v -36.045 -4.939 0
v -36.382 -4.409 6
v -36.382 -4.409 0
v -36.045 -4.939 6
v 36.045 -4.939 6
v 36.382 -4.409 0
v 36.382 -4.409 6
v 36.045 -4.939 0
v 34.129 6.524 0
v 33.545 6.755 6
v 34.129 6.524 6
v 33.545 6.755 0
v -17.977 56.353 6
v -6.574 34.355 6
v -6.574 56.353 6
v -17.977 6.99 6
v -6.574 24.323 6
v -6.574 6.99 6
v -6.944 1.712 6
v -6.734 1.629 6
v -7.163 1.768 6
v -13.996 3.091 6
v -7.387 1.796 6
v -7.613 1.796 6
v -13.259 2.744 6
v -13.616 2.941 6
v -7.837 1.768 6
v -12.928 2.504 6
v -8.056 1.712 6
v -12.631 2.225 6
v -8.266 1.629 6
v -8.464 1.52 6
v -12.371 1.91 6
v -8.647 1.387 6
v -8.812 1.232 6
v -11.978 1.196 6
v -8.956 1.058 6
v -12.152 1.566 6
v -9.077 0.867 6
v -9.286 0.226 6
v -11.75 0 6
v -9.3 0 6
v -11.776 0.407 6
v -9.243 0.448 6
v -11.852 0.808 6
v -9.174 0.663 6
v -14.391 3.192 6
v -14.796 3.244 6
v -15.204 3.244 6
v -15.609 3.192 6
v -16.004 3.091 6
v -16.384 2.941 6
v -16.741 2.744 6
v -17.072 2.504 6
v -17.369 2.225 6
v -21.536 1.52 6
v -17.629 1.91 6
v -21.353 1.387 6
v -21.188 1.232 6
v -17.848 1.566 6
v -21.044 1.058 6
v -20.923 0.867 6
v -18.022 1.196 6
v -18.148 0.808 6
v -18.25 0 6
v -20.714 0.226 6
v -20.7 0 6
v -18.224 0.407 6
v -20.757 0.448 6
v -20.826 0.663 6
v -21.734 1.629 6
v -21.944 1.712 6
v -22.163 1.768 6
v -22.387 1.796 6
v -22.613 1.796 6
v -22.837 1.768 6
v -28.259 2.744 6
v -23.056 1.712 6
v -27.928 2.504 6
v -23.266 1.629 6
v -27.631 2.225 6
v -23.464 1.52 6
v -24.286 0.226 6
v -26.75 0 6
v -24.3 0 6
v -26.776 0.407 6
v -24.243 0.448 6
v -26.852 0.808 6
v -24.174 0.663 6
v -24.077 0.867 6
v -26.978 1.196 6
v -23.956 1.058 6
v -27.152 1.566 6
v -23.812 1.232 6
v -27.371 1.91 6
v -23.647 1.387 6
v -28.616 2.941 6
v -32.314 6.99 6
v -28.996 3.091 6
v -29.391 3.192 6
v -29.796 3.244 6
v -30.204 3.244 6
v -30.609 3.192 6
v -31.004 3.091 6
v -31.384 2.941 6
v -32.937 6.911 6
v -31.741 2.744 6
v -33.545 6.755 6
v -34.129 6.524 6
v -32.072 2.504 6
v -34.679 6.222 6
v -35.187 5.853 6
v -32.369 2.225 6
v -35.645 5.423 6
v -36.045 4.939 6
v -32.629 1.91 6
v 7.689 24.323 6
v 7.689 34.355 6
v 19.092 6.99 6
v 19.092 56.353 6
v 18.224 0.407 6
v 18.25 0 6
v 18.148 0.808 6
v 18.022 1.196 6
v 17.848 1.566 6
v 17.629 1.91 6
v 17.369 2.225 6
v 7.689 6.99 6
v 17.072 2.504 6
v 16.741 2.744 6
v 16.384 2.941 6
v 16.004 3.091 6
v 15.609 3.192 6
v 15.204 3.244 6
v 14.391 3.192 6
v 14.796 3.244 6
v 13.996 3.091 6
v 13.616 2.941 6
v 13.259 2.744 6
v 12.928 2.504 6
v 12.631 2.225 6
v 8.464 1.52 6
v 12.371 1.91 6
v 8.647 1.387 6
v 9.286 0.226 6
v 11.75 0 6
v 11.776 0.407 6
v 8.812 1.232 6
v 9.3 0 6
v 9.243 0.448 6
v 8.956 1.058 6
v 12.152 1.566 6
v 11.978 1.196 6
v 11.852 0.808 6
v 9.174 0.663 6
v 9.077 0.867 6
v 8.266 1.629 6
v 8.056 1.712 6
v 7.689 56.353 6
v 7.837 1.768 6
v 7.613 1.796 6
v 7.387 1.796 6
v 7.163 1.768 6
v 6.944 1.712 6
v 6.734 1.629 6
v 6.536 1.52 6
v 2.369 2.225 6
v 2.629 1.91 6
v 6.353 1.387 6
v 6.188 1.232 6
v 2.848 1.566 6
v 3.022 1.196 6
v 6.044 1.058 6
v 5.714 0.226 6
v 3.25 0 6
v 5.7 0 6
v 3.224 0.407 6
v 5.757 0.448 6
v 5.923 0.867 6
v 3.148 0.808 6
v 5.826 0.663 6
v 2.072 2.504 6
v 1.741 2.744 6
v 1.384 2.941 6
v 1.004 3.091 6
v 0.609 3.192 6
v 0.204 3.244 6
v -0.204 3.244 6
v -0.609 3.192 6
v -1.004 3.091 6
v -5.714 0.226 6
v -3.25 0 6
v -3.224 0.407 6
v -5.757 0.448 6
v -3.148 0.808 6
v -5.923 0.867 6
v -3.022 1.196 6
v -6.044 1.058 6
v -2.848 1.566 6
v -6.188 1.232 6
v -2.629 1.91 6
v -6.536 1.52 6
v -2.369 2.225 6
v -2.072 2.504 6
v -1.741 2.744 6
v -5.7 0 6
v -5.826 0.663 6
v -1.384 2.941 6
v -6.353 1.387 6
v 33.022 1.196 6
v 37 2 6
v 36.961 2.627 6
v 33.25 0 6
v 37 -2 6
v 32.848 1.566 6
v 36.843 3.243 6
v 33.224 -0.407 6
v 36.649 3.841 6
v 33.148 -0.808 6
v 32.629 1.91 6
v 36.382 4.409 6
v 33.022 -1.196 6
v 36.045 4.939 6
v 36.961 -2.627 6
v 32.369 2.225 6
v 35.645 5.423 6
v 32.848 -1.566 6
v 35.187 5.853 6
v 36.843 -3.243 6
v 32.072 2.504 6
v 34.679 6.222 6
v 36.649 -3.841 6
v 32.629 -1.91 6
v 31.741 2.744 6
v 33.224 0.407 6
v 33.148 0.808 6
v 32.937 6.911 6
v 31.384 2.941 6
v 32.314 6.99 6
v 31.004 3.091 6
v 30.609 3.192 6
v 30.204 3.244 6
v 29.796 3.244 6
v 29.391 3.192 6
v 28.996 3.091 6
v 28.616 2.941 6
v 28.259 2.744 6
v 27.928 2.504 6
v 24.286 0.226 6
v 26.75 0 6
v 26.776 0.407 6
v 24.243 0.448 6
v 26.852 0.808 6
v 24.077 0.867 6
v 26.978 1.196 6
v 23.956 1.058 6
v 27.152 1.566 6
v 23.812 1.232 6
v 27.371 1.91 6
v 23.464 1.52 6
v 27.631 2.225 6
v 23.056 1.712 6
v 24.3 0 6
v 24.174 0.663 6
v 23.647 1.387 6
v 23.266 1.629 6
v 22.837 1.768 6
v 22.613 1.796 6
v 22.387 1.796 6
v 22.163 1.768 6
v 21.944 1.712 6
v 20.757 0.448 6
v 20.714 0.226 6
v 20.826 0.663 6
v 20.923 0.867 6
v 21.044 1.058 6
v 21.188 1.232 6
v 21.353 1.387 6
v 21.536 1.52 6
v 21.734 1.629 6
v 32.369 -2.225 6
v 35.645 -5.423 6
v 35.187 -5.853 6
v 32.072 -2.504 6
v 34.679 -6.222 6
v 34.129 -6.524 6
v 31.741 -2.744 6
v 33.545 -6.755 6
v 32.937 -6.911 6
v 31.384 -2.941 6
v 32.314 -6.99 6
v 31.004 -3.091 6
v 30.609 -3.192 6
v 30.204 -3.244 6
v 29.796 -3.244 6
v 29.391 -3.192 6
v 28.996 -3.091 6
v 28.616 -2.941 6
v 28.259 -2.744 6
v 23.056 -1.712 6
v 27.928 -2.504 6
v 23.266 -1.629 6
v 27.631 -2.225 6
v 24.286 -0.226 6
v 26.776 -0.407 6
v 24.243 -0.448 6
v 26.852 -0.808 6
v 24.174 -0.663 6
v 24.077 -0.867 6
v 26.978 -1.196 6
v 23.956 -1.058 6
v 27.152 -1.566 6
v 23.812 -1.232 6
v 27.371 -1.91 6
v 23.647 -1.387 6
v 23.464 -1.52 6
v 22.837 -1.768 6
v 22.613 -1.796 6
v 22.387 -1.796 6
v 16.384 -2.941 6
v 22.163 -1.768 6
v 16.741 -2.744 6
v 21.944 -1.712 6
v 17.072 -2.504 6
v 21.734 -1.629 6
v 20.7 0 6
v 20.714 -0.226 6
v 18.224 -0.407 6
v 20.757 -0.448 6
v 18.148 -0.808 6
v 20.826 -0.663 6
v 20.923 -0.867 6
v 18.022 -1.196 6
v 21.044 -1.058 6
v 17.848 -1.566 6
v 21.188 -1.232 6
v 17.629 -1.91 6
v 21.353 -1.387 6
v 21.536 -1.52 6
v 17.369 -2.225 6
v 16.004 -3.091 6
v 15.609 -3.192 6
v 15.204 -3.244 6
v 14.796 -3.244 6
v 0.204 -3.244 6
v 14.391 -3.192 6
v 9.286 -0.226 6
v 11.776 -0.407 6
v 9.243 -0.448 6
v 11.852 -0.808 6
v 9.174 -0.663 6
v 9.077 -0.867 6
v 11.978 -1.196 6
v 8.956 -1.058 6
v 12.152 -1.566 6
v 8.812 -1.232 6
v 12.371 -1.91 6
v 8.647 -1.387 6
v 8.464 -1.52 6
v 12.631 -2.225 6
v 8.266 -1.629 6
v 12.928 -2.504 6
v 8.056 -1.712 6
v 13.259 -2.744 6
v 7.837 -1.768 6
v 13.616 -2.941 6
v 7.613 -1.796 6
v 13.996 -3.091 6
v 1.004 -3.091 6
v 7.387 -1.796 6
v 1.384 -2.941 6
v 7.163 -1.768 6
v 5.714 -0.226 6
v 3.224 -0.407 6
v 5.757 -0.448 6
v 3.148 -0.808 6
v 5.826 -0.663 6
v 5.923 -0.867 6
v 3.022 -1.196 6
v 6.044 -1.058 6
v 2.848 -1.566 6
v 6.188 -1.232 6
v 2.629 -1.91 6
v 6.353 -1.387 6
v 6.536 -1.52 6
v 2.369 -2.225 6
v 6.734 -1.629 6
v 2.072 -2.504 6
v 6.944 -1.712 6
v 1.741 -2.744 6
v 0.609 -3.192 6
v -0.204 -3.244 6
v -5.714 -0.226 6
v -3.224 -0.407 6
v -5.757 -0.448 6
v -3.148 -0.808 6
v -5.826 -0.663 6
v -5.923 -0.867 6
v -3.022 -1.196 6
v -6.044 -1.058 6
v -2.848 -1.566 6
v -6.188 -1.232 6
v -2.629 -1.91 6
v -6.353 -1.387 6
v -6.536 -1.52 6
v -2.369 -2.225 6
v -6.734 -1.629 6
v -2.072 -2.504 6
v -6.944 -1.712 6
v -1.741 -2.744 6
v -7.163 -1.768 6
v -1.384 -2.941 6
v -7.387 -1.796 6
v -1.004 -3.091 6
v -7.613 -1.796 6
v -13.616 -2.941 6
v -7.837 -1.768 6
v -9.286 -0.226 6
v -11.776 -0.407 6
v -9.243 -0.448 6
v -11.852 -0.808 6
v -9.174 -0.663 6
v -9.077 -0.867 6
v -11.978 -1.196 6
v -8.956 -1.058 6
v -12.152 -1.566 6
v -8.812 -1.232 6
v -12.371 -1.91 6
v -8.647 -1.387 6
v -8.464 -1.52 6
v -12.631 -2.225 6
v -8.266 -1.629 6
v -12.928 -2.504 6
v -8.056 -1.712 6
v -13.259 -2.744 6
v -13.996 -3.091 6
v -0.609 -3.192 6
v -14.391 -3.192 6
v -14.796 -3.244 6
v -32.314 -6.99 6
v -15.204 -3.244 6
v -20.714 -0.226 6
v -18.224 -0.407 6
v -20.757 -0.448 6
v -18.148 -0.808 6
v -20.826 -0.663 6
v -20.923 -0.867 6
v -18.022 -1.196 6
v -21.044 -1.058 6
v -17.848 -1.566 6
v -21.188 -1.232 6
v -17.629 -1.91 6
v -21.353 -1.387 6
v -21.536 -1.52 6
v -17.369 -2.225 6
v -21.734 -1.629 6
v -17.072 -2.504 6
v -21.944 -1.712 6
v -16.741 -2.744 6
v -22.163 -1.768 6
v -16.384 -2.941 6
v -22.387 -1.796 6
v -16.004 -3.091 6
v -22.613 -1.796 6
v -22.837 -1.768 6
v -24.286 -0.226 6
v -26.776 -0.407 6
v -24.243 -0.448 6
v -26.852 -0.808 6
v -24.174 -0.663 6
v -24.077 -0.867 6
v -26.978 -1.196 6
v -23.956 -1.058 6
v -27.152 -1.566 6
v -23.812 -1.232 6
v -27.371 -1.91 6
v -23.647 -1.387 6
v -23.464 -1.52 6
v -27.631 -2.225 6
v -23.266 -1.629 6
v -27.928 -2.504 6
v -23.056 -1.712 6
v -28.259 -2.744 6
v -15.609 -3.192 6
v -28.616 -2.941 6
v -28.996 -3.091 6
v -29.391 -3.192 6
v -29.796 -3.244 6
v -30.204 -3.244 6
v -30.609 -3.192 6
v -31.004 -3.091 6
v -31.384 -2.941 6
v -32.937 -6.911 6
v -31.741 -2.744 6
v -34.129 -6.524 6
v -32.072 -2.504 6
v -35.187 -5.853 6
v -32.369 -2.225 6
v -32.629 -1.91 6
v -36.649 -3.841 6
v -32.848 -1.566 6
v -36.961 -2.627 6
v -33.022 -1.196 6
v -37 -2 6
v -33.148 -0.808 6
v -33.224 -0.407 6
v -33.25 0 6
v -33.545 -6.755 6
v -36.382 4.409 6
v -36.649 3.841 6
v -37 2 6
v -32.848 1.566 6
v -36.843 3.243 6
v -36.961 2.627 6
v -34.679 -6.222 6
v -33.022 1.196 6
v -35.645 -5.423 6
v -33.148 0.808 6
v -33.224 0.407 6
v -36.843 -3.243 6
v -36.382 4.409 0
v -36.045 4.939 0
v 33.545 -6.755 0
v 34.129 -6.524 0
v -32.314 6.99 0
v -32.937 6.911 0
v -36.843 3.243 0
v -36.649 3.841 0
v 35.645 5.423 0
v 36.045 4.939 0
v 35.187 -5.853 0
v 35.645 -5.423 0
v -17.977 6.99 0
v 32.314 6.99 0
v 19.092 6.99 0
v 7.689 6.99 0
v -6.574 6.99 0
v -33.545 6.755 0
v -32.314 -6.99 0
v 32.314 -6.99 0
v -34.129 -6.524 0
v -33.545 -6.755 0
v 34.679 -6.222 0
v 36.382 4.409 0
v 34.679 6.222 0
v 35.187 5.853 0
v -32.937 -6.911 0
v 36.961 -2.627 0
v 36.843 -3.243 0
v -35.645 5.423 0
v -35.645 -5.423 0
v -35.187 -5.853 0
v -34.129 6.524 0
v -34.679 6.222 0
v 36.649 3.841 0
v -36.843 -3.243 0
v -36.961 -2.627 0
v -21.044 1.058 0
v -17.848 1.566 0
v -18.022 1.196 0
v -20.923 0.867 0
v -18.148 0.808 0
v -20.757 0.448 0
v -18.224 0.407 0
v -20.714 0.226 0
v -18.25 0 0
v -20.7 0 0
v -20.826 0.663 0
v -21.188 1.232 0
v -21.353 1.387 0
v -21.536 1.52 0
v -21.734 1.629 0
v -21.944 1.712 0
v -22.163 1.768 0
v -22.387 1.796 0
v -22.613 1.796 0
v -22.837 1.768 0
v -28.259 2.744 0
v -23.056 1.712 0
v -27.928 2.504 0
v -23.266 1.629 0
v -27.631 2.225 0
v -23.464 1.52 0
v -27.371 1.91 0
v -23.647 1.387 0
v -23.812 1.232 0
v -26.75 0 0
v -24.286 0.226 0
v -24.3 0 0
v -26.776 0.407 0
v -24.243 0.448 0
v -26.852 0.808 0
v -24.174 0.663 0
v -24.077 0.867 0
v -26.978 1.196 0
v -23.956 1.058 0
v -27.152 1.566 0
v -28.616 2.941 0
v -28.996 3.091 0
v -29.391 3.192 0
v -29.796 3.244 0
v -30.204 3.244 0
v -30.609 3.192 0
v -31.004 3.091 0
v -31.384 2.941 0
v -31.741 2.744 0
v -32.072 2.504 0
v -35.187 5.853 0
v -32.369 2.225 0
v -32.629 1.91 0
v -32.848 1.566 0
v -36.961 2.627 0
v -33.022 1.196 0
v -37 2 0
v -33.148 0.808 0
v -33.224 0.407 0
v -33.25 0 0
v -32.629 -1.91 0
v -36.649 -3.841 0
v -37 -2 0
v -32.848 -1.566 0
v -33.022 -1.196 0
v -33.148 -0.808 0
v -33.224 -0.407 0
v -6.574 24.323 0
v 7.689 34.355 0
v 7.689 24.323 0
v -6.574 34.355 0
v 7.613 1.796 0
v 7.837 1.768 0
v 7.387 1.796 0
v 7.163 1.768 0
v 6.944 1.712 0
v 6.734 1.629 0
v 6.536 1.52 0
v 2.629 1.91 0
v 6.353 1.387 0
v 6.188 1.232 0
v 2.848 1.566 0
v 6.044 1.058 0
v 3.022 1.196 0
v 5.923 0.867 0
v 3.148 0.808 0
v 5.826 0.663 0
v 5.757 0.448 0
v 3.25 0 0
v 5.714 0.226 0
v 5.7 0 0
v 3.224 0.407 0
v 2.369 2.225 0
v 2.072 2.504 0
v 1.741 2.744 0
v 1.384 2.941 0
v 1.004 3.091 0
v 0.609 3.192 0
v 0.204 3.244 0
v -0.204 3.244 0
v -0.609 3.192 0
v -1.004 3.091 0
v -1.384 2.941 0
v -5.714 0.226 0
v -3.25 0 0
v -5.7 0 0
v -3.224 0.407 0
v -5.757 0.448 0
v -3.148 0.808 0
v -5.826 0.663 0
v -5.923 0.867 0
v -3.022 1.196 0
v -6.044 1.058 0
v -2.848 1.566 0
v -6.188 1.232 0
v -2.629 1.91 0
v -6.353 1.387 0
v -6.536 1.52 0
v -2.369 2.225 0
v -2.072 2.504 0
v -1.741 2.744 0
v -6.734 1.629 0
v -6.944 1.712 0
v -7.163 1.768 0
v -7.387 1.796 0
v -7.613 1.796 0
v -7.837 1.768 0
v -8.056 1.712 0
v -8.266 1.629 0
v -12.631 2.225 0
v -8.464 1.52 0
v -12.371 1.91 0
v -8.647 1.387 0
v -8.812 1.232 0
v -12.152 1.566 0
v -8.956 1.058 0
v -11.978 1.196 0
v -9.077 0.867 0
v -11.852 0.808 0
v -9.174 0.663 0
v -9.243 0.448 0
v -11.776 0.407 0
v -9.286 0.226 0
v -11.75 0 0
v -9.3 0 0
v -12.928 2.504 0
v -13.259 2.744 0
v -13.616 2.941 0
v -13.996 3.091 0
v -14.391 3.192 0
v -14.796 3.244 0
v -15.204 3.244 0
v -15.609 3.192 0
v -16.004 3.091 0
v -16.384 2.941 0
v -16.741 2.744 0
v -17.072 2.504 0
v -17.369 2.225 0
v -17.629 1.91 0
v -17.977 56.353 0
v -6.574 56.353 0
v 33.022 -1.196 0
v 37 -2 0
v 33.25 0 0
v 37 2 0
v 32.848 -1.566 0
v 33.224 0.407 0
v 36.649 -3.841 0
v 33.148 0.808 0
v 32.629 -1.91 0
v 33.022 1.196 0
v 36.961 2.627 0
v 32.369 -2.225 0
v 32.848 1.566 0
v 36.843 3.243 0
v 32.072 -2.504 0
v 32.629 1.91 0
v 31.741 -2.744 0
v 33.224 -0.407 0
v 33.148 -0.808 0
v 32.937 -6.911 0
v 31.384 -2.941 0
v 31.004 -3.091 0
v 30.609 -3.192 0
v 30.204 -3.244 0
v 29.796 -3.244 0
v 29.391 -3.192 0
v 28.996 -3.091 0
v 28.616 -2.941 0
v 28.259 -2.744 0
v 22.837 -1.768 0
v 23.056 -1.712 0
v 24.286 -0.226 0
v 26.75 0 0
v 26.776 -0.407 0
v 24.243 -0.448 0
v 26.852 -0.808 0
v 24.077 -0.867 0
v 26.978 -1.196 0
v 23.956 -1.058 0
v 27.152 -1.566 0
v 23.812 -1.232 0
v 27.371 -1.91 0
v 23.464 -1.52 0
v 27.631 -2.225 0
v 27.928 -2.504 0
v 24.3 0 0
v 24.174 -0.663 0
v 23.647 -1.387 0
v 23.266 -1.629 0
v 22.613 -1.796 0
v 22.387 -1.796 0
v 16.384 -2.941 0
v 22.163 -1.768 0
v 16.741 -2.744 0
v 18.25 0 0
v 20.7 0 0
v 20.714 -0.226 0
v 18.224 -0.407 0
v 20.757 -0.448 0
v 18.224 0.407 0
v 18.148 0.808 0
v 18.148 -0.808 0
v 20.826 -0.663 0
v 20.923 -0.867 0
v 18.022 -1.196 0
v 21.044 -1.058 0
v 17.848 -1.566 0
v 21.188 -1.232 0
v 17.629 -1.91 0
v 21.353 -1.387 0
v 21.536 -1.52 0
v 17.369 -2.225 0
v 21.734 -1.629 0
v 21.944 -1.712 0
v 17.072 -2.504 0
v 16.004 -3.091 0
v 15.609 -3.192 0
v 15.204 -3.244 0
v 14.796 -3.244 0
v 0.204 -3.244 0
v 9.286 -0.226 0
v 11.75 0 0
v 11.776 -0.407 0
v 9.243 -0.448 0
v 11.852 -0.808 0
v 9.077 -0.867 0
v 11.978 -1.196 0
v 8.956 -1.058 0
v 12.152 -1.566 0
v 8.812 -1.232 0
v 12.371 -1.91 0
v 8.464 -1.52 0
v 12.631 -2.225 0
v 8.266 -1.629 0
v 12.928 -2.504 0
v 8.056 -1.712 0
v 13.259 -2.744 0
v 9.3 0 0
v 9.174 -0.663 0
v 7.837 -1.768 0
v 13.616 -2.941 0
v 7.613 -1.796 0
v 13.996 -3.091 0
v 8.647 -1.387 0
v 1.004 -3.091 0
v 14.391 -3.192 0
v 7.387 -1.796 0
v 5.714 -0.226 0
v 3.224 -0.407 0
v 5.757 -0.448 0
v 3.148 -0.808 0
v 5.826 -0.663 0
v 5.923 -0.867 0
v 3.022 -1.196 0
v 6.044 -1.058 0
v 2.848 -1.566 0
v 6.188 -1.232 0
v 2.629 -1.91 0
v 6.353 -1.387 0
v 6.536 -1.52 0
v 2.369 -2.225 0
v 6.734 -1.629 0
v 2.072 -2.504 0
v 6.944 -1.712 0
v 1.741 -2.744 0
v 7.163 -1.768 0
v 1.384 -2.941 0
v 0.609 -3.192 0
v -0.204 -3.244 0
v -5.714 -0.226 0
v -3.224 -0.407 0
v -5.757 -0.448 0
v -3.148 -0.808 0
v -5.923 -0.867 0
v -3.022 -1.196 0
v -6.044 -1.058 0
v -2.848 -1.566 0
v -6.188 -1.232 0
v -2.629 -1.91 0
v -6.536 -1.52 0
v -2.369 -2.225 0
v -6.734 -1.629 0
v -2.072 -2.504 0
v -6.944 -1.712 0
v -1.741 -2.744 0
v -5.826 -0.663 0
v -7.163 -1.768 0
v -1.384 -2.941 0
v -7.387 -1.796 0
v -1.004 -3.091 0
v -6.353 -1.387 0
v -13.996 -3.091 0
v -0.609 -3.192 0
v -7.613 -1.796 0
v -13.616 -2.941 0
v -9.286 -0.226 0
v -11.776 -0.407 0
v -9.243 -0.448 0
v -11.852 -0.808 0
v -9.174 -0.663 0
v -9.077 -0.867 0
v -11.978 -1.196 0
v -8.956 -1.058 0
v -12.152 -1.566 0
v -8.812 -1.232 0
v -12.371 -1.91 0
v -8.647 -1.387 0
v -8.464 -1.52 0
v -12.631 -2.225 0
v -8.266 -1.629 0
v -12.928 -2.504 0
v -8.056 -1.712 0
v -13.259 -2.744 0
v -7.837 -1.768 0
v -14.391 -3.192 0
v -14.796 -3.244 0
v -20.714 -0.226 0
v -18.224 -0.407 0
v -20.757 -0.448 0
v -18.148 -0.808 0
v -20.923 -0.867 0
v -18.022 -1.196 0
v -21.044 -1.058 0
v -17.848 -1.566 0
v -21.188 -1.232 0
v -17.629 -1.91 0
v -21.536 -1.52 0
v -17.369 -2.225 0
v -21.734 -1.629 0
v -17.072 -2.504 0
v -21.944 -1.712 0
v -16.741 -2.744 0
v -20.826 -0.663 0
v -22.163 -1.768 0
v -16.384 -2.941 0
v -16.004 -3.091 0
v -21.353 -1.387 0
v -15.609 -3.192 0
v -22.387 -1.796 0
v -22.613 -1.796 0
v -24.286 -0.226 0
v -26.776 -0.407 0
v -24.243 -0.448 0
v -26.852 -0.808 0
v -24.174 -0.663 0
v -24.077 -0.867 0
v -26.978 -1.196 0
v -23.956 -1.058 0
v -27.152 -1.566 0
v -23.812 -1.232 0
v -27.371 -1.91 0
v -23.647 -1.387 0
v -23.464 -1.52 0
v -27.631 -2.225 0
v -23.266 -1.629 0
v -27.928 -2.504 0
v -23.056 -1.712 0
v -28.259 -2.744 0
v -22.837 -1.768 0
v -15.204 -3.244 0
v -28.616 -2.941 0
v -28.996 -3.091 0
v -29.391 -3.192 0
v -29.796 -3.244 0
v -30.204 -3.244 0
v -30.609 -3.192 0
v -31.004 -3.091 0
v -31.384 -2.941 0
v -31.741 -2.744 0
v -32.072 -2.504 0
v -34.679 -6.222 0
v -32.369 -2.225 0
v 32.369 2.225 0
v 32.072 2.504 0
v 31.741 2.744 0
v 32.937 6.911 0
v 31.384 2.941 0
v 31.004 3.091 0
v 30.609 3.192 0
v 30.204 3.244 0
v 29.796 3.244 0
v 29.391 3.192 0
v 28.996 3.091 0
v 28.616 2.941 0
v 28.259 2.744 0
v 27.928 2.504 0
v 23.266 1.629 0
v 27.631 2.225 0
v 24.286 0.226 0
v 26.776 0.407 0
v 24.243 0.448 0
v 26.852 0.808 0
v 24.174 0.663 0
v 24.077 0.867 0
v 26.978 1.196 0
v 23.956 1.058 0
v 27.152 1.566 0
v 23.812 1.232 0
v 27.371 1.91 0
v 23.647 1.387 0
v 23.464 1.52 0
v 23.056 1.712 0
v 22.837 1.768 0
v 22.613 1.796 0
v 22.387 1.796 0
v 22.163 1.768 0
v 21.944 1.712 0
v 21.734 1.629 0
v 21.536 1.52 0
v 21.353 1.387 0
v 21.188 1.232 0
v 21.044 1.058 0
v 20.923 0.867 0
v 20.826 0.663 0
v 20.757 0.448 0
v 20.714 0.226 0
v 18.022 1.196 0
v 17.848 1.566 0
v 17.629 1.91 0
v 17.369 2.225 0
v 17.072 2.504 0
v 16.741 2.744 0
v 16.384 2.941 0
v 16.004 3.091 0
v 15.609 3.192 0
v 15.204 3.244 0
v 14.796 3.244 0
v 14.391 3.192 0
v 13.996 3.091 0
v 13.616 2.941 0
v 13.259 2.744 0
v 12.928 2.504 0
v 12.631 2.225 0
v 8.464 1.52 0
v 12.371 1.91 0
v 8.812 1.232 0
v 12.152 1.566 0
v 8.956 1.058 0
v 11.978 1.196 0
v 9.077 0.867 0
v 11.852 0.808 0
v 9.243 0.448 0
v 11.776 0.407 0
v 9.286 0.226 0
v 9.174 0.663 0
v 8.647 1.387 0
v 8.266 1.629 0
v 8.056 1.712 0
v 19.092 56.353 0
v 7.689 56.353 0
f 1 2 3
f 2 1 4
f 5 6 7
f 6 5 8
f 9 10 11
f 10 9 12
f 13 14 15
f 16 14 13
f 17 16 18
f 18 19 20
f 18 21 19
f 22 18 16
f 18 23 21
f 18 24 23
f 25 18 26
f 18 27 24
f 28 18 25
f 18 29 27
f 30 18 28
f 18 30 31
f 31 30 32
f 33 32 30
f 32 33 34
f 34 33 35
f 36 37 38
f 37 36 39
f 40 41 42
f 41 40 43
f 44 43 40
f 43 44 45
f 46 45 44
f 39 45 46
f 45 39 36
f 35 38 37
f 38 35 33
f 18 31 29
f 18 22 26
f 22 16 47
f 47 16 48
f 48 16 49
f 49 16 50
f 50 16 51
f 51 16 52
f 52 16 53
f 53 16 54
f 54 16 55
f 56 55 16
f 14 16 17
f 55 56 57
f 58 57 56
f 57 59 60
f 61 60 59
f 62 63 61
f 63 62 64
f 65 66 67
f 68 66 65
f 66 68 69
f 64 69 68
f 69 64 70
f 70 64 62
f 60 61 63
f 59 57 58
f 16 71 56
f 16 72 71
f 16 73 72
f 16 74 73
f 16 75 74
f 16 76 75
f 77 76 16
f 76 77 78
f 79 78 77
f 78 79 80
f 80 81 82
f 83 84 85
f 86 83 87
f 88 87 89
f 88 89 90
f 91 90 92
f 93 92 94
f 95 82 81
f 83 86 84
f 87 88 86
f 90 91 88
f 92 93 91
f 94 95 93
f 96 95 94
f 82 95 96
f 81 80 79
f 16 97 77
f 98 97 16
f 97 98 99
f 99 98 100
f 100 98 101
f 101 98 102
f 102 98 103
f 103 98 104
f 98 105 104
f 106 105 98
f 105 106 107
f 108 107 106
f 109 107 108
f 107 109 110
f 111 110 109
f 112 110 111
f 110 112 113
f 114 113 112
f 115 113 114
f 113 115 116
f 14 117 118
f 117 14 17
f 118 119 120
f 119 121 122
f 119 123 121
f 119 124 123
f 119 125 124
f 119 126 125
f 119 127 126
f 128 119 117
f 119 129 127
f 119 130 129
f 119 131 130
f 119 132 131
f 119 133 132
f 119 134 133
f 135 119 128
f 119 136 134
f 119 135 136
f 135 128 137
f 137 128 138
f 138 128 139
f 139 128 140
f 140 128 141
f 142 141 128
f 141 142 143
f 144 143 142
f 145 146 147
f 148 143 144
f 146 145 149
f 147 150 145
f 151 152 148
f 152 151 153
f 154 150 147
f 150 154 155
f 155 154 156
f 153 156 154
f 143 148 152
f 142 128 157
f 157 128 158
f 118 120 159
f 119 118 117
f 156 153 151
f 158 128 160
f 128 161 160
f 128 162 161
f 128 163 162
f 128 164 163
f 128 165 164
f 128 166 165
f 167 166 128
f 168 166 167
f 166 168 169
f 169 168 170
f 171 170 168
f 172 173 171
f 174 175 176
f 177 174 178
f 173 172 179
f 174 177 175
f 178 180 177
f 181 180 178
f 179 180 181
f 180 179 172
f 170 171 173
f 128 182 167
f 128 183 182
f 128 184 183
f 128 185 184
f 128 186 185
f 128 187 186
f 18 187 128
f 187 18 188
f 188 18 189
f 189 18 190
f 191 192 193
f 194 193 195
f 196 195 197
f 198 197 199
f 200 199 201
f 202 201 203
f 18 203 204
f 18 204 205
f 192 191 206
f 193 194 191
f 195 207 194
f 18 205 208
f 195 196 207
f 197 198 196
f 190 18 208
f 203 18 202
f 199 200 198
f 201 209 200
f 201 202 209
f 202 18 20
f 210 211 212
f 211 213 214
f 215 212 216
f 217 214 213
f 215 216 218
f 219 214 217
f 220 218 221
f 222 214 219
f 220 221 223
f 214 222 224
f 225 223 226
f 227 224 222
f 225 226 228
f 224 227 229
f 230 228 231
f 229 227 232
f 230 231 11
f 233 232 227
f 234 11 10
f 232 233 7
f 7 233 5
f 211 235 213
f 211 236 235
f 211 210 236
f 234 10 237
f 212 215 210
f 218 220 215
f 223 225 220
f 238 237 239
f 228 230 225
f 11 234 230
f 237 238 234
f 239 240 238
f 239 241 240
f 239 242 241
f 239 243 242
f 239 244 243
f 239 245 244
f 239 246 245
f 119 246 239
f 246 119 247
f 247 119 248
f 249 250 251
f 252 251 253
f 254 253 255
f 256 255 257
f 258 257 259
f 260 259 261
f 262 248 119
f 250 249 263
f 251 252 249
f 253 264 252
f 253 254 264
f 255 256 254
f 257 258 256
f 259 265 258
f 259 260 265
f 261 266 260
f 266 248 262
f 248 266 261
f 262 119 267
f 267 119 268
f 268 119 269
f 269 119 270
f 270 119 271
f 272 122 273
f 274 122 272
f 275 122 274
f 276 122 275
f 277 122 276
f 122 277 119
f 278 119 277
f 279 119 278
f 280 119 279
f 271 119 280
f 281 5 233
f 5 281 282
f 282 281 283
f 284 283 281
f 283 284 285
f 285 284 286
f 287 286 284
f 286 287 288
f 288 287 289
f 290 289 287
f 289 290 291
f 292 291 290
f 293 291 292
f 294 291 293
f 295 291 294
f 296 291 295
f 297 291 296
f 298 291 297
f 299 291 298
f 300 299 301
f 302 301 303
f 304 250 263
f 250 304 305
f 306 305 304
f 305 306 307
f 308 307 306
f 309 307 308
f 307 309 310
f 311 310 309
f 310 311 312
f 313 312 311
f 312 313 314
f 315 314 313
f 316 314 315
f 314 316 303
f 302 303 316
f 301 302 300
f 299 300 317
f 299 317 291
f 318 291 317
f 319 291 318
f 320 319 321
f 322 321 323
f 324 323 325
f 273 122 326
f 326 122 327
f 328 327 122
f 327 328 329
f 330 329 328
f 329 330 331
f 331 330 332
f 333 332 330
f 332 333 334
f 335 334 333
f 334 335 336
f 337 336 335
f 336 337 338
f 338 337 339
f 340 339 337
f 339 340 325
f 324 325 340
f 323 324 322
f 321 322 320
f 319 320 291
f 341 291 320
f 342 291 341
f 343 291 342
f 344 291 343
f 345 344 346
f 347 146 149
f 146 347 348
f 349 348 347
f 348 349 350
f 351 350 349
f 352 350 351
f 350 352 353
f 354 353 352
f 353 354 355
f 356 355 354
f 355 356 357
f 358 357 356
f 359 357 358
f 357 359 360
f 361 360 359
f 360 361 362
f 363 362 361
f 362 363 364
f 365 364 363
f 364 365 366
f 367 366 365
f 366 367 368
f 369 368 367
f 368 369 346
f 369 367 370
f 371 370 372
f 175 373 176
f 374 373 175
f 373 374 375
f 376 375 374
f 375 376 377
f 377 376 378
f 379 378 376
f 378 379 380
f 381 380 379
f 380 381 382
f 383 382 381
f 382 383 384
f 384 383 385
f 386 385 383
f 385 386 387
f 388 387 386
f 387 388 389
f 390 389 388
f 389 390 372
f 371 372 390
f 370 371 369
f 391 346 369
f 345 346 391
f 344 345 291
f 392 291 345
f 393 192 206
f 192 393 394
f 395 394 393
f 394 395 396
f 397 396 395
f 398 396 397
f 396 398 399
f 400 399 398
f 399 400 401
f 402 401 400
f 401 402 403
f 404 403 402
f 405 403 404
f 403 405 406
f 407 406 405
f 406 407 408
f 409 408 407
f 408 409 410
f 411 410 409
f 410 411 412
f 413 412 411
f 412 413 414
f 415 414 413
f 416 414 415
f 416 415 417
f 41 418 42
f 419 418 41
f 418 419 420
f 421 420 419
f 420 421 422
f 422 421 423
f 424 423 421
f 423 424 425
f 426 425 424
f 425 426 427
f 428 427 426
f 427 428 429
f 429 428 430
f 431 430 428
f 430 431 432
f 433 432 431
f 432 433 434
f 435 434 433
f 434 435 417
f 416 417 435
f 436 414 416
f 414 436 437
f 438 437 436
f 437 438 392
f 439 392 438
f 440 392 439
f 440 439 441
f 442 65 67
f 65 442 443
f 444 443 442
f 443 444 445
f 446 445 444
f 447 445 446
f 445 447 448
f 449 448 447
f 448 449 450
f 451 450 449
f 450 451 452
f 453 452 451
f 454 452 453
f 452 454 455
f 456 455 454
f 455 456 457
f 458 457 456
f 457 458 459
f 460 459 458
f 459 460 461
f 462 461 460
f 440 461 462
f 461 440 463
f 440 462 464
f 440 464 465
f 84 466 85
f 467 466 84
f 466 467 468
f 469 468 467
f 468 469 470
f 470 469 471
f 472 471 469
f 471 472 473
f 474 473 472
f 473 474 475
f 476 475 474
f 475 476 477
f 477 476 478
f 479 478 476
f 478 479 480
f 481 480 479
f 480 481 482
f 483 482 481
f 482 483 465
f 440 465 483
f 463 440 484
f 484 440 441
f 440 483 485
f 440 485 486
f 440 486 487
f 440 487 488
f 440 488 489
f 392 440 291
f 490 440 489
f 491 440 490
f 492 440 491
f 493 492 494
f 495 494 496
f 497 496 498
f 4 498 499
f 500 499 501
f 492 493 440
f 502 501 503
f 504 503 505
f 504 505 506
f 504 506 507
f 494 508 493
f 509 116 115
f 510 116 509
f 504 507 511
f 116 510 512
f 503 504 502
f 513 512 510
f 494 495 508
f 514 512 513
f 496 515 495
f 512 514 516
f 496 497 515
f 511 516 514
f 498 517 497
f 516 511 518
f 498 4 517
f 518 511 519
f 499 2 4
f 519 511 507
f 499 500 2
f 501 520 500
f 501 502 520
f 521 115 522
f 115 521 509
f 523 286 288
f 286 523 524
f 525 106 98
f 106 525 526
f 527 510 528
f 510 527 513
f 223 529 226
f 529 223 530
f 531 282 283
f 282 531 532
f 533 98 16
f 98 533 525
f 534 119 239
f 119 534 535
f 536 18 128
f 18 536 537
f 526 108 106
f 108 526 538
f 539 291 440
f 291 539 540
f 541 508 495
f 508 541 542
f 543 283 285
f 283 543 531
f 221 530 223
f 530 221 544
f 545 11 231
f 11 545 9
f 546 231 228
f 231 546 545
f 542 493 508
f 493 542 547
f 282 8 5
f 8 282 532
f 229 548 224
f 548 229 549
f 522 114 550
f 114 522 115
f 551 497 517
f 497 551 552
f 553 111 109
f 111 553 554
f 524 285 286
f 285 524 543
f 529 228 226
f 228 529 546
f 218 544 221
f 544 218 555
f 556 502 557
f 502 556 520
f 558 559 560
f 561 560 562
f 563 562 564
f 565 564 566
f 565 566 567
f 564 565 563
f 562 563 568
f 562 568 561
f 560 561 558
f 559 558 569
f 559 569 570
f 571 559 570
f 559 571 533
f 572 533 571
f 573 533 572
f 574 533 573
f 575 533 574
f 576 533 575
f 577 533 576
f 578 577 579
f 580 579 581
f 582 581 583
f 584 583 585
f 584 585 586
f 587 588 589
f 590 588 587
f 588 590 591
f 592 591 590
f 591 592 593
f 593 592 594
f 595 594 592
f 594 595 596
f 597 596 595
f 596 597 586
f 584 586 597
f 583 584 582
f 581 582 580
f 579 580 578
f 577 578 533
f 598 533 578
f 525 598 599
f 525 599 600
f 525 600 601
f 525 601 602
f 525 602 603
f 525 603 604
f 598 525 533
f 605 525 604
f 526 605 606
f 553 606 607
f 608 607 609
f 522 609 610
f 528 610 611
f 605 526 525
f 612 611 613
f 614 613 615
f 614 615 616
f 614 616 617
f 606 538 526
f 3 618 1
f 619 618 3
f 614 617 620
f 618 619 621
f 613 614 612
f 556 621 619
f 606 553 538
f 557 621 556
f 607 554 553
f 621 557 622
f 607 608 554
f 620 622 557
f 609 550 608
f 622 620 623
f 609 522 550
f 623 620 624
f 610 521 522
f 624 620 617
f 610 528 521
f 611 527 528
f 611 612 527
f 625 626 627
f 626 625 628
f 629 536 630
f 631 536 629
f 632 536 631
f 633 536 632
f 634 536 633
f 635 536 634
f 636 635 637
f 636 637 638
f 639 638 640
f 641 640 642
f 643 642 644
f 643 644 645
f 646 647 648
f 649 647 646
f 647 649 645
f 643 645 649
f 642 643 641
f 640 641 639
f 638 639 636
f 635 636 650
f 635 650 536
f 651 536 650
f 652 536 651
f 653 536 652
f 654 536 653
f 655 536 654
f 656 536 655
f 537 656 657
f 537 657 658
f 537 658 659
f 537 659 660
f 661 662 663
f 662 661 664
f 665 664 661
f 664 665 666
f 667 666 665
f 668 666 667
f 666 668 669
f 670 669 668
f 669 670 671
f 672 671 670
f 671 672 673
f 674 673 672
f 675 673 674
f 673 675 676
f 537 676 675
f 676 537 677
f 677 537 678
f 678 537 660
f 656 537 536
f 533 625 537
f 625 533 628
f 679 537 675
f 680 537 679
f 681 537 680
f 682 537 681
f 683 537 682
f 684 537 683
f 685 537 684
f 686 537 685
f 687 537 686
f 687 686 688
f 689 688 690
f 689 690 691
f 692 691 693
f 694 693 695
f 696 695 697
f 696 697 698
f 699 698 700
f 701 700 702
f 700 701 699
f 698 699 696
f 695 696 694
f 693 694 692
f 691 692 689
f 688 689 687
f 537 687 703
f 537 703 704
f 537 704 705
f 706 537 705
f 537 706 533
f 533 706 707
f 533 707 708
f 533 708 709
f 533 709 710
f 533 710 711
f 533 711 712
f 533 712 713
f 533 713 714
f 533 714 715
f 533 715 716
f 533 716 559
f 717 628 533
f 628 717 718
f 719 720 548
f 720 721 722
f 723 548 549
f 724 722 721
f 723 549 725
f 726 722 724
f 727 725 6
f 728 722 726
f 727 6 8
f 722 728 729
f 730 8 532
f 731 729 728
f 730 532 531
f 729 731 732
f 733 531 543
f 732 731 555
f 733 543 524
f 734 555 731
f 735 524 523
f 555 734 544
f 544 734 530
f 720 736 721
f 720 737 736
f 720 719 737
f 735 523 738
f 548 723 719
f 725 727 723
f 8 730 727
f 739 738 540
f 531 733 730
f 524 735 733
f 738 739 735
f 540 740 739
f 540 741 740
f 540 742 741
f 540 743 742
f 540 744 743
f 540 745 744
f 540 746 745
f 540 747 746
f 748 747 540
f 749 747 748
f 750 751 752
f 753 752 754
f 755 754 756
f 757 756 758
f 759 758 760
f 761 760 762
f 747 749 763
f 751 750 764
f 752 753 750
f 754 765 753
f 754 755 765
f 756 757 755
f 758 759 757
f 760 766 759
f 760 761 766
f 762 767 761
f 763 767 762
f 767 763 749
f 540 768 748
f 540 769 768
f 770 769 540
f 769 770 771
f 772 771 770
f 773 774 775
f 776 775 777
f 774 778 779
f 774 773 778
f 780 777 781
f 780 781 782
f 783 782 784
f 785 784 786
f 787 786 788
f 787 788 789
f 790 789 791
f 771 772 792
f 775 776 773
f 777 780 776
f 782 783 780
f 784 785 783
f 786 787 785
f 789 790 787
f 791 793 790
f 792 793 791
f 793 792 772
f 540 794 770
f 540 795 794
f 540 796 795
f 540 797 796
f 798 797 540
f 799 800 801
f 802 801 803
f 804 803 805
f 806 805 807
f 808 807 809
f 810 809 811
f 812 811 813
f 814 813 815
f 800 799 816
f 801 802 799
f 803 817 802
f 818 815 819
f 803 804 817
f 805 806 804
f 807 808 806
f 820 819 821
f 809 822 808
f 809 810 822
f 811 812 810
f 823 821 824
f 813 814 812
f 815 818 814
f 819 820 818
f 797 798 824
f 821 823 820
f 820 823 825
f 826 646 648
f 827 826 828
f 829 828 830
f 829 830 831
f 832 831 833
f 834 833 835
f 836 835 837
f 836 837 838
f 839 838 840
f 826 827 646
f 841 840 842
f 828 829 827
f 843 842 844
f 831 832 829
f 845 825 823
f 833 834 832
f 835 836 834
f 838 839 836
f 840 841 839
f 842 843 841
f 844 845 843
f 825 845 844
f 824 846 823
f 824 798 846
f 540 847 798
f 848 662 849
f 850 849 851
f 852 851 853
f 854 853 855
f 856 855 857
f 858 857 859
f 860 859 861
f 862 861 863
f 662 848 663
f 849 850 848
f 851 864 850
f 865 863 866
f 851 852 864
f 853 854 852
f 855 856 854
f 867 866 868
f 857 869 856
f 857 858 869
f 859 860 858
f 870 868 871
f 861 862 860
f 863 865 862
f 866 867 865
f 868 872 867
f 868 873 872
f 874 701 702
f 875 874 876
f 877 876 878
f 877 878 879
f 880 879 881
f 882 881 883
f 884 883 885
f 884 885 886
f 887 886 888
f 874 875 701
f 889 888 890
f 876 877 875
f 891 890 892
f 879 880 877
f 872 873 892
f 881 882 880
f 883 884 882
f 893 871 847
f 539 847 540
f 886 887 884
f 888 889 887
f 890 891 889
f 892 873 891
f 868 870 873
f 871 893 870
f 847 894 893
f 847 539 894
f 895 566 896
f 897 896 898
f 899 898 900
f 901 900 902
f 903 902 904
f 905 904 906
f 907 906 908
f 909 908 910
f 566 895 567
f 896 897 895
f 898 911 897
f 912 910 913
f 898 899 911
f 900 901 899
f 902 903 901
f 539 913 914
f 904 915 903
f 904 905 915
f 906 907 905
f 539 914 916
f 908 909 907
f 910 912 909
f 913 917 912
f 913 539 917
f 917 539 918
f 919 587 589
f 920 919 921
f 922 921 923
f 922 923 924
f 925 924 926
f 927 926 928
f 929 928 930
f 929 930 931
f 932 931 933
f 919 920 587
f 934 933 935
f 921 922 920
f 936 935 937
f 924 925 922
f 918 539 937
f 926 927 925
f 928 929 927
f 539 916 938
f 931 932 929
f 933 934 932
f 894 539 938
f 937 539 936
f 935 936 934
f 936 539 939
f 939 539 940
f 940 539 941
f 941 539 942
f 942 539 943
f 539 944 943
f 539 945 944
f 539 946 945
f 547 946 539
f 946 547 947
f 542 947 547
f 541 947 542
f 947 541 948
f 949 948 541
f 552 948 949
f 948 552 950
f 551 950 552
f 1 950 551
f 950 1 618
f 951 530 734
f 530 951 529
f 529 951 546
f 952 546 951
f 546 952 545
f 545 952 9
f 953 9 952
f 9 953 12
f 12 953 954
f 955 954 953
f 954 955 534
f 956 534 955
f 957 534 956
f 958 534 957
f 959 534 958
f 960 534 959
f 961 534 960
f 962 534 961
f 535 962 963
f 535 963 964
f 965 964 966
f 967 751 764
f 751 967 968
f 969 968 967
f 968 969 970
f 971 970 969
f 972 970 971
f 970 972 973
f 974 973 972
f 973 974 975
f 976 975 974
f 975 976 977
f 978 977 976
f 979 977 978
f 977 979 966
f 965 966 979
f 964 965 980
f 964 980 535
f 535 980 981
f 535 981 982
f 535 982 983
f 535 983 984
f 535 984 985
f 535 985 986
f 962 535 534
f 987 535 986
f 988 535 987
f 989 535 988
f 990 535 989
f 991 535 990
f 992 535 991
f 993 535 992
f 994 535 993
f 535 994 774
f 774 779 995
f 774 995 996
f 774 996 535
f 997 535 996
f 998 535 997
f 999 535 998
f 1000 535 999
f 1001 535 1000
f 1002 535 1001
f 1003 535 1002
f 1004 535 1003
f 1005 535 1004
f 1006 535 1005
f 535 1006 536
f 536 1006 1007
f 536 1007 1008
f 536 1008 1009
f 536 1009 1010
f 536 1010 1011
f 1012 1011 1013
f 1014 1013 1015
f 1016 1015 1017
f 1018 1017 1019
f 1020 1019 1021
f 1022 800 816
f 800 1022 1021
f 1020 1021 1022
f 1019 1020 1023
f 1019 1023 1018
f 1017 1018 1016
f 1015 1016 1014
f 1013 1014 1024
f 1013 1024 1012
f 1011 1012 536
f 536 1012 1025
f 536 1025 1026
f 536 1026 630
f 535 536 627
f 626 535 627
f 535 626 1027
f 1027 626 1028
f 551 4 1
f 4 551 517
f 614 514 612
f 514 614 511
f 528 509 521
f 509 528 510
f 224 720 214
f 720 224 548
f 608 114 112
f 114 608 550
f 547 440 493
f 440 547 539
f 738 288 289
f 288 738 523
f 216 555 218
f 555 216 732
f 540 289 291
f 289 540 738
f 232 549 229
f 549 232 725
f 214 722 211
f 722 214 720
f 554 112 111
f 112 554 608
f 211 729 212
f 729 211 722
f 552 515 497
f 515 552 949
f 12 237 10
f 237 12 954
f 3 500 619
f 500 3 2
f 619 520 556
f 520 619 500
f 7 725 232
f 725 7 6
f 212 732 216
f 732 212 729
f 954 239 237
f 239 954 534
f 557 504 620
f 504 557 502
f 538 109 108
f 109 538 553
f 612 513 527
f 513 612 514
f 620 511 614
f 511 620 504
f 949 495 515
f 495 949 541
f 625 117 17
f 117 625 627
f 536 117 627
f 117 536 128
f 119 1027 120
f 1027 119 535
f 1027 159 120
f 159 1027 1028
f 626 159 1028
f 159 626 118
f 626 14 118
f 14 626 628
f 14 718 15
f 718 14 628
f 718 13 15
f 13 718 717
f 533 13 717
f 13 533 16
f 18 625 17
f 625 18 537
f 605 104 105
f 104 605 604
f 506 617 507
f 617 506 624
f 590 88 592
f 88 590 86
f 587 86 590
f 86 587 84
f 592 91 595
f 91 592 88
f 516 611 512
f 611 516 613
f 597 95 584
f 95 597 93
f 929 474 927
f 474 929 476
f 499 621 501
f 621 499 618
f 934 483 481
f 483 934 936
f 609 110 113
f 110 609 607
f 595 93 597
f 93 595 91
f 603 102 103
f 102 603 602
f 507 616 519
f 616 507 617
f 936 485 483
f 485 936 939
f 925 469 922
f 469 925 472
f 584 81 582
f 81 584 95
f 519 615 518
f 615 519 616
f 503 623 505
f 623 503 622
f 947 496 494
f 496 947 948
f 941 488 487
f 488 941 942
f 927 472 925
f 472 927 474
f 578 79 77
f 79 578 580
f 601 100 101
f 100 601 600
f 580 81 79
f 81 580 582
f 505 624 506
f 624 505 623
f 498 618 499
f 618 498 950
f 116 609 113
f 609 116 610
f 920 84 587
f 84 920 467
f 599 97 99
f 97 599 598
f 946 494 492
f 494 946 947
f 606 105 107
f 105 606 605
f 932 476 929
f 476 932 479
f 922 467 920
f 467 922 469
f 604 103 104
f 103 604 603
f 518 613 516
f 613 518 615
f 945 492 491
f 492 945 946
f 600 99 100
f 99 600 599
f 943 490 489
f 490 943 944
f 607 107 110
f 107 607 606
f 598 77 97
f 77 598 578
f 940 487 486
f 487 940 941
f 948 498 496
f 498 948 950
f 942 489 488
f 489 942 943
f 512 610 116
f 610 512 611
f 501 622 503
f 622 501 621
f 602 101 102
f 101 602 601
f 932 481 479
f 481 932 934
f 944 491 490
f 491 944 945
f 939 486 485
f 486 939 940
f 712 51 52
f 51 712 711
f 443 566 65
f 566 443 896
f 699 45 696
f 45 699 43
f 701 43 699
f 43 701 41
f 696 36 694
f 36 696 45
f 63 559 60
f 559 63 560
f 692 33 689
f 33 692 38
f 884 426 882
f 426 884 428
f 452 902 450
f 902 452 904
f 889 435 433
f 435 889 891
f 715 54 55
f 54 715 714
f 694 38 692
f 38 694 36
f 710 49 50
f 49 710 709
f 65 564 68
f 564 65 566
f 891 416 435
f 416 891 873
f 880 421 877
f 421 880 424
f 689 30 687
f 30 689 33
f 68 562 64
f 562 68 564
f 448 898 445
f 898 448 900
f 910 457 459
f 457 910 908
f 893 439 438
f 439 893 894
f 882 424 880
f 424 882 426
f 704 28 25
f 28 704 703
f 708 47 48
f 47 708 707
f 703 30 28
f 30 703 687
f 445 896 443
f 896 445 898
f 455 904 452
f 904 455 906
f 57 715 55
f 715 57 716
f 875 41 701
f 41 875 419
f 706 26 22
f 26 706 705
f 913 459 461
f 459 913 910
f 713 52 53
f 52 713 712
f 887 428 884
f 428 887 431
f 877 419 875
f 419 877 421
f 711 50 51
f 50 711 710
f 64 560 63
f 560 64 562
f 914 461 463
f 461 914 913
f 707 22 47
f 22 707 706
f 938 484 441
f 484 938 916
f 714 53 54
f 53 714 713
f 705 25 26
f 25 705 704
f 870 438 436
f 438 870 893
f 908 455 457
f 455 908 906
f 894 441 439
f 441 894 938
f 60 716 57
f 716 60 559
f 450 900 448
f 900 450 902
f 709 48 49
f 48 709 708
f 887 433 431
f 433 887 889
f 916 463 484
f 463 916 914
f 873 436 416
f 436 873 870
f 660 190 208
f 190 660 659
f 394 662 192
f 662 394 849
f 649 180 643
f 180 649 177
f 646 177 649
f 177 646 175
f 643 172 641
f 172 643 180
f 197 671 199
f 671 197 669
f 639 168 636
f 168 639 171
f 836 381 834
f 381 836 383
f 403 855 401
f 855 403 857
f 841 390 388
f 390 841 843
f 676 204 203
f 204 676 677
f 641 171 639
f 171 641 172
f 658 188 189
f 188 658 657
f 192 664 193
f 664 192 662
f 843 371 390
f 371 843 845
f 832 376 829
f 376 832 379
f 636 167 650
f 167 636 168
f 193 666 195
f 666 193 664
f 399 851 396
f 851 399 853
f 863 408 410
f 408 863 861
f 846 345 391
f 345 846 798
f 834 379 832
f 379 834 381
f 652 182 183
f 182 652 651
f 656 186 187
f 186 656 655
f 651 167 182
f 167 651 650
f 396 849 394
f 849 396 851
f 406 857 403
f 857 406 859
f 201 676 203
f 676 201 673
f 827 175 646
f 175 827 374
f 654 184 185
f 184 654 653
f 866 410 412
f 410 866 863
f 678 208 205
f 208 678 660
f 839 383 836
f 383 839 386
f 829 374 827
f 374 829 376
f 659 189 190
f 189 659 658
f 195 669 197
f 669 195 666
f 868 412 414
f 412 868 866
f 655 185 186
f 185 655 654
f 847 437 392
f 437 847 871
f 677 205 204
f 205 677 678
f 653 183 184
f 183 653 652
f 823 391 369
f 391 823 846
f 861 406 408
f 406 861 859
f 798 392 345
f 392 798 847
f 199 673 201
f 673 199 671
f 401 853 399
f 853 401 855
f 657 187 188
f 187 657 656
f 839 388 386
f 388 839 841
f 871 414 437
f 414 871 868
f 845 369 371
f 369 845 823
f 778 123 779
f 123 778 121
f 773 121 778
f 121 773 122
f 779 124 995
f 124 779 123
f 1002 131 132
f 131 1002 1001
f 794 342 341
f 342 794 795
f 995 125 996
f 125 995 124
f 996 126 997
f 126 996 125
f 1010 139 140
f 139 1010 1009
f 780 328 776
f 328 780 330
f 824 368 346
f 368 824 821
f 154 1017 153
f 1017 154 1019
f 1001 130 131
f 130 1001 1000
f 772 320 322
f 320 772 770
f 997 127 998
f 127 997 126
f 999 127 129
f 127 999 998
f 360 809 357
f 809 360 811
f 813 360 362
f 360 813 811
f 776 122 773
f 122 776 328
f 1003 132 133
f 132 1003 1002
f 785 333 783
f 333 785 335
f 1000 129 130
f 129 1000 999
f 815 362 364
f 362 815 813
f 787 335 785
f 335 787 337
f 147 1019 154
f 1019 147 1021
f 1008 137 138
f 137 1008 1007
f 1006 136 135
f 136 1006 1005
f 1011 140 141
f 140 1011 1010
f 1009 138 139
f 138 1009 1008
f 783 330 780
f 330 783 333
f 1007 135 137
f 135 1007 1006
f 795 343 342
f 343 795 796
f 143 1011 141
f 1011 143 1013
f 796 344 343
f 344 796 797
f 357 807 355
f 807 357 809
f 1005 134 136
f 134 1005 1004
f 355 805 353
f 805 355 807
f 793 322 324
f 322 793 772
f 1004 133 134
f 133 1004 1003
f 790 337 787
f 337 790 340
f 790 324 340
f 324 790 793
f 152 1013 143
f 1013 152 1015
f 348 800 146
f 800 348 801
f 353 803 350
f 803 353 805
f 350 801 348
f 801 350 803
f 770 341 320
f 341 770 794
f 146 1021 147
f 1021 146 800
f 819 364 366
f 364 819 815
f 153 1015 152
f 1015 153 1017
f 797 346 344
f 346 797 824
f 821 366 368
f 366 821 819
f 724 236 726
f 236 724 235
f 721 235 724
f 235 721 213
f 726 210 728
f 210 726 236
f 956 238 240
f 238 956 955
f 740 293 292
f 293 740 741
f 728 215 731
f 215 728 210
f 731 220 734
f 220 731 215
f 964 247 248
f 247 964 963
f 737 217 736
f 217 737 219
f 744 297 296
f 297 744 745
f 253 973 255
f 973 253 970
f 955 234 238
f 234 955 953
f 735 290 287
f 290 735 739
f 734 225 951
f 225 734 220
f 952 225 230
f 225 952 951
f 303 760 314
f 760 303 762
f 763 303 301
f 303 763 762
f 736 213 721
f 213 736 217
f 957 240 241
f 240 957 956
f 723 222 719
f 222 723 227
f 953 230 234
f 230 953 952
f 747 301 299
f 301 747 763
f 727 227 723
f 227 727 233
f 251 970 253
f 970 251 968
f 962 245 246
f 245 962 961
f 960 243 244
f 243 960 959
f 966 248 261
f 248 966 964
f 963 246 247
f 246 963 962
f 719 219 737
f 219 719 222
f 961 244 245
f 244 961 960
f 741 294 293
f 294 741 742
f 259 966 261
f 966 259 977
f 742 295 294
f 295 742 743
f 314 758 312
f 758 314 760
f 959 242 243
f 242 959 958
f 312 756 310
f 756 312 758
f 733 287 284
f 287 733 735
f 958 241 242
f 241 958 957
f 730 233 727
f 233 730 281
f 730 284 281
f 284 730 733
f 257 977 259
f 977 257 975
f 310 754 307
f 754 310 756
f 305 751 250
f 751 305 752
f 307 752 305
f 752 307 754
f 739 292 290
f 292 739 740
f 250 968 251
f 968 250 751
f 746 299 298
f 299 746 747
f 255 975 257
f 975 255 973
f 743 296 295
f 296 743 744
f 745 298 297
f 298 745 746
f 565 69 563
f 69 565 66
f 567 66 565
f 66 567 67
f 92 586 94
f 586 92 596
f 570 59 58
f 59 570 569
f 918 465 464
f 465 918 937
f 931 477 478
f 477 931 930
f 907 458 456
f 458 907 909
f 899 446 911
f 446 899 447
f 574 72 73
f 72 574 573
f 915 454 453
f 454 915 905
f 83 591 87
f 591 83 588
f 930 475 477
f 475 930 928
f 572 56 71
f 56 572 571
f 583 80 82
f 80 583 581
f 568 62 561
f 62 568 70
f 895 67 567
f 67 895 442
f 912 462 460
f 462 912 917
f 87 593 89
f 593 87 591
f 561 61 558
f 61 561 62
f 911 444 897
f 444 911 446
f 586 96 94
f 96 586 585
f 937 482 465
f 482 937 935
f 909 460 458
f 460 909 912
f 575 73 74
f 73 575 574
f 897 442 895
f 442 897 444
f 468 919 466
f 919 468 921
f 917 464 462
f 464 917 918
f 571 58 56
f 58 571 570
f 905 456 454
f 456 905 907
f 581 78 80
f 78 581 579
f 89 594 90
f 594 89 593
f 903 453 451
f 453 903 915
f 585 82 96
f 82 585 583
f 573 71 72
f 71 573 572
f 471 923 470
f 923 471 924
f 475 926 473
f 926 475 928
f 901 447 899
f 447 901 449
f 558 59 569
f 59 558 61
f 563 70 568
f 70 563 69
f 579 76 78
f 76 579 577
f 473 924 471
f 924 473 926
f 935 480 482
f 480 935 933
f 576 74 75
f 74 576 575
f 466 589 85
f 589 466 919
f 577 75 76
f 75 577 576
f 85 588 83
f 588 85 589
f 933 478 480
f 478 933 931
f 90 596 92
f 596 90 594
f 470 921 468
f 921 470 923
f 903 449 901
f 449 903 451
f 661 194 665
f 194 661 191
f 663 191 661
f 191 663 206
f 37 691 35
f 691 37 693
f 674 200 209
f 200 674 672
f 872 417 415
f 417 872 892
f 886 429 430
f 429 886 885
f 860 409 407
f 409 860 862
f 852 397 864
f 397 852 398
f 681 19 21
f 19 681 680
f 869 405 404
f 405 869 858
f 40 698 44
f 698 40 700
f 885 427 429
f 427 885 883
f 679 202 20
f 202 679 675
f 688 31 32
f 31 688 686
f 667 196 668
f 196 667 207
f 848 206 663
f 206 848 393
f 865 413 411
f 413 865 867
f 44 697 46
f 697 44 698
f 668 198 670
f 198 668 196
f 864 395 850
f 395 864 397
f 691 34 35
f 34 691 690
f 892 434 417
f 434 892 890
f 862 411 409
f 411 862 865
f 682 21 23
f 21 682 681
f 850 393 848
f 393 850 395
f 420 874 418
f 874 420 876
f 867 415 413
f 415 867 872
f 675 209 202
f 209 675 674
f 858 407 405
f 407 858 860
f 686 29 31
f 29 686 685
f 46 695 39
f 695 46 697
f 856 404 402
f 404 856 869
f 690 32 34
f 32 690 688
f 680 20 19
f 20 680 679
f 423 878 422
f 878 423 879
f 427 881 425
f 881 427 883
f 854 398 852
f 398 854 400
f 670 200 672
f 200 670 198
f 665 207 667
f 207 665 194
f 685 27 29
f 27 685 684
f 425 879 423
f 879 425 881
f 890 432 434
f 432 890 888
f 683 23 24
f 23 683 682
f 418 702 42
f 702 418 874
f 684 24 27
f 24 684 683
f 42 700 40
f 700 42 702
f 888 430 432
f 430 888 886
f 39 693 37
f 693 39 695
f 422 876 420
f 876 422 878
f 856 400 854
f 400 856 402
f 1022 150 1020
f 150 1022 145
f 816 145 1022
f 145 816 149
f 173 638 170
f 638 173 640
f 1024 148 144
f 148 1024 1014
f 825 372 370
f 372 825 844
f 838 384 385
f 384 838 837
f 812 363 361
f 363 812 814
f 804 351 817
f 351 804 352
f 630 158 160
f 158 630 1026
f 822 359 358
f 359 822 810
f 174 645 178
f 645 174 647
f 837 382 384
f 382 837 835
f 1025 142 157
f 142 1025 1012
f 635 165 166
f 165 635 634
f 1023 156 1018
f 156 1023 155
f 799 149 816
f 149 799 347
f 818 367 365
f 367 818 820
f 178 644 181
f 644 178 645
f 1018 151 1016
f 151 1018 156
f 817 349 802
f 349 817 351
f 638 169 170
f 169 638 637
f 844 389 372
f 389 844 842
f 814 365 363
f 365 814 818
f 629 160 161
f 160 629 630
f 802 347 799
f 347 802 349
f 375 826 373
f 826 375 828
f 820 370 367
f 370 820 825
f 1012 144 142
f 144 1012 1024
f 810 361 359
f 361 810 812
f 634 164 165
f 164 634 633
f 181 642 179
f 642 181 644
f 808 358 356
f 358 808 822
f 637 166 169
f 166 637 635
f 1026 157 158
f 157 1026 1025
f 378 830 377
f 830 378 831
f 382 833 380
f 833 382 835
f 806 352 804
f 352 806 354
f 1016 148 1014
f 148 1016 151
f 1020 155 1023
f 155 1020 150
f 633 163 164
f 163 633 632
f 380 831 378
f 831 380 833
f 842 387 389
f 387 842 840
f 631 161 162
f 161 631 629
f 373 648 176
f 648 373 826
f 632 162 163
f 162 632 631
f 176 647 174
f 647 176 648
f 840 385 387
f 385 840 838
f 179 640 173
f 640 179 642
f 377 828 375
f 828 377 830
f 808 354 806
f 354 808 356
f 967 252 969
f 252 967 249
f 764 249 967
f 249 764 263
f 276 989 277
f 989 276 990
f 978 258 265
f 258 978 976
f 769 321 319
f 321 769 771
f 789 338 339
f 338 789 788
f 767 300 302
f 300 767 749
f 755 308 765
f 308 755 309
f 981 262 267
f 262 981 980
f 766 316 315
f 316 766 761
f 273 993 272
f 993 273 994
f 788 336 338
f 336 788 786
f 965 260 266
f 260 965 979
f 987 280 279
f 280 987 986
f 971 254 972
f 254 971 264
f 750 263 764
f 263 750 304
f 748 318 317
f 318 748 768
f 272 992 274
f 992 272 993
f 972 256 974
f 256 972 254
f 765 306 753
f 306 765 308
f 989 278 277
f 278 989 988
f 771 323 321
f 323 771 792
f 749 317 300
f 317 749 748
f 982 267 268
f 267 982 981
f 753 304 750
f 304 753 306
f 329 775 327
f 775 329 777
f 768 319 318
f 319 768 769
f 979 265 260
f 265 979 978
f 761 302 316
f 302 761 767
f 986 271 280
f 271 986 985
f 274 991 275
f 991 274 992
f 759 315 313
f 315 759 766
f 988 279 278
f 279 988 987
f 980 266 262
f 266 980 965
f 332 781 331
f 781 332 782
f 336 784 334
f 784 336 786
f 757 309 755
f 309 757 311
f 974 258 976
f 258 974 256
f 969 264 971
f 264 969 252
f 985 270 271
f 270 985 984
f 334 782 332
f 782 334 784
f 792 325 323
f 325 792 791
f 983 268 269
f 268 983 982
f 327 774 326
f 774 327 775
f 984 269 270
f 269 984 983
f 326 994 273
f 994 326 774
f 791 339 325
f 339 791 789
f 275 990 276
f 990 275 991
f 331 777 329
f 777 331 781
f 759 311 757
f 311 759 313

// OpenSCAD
$fn = 50;


difference() {
	union() {
		hull() {
			translate(v = [-32.0000000000, 2.0000000000, 0]) {
				cylinder(h = 6, r = 5);
			}
			translate(v = [32.0000000000, 2.0000000000, 0]) {
				cylinder(h = 6, r = 5);
			}
			translate(v = [-32.0000000000, -2.0000000000, 0]) {
				cylinder(h = 6, r = 5);
			}
			translate(v = [32.0000000000, -2.0000000000, 0]) {
				cylinder(h = 6, r = 5);
			}
		}
		translate(v = [0, 55, 0]) {
			linear_extrude(height = 6) {
				text(font = "DejaVu Sans Mono:style=Bold", halign = "center", size = 57.0000000000, text = "H", valign = "top");
			}
		}
	}
	union() {
		translate(v = [-30.0000000000, 0.0000000000, 0]) {
			translate(v = [0, 0, -100]) {
				cylinder(h = 200, r = 3.2500000000);
			}
		}
		translate(v = [-15.0000000000, 0.0000000000, 0]) {
			translate(v = [0, 0, -100]) {
				cylinder(h = 200, r = 3.2500000000);
			}
		}
		translate(v = [0, 0, -100]) {
			cylinder(h = 200, r = 3.2500000000);
		}
		translate(v = [15.0000000000, 0.0000000000, 0]) {
			translate(v = [0, 0, -100]) {
				cylinder(h = 200, r = 3.2500000000);
			}
		}
		translate(v = [30.0000000000, 0.0000000000, 0]) {
			translate(v = [0, 0, -100]) {
				cylinder(h = 200, r = 3.2500000000);
			}
		}
		translate(v = [-30.0000000000, 0.0000000000, 0]) {
			translate(v = [0, 0, -100]) {
				cylinder(h = 200, r = 1.8000000000);
			}
		}
		translate(v = [-22.5000000000, 0.0000000000, 0]) {
			translate(v = [0, 0, -100]) {
				cylinder(h = 200, r = 1.8000000000);
			}
		}
		translate(v = [-15.0000000000, 0.0000000000, 0]) {
			translate(v = [0, 0, -100]) {
				cylinder(h = 200, r = 1.8000000000);
			}
		}
		translate(v = [-7.5000000000, 0.0000000000, 0]) {
			translate(v = [0, 0, -100]) {
				cylinder(h = 200, r = 1.8000000000);
			}
		}
		translate(v = [0, 0, -100]) {
			cylinder(h = 200, r = 1.8000000000);
		}
		translate(v = [7.5000000000, 0.0000000000, 0]) {
			translate(v = [0, 0, -100]) {
				cylinder(h = 200, r = 1.8000000000);
			}
		}
		translate(v = [15.0000000000, 0.0000000000, 0]) {
			translate(v = [0, 0, -100]) {
				cylinder(h = 200, r = 1.8000000000);
			}
		}
		translate(v = [22.5000000000, 0.0000000000, 0]) {
			translate(v = [0, 0, -100]) {
				cylinder(h = 200, r = 1.8000000000);
			}
		}
		translate(v = [30.0000000000, 0.0000000000, 0]) {
			translate(v = [0, 0, -100]) {
				cylinder(h = 200, r = 1.8000000000);
			}
		}
	}
}
